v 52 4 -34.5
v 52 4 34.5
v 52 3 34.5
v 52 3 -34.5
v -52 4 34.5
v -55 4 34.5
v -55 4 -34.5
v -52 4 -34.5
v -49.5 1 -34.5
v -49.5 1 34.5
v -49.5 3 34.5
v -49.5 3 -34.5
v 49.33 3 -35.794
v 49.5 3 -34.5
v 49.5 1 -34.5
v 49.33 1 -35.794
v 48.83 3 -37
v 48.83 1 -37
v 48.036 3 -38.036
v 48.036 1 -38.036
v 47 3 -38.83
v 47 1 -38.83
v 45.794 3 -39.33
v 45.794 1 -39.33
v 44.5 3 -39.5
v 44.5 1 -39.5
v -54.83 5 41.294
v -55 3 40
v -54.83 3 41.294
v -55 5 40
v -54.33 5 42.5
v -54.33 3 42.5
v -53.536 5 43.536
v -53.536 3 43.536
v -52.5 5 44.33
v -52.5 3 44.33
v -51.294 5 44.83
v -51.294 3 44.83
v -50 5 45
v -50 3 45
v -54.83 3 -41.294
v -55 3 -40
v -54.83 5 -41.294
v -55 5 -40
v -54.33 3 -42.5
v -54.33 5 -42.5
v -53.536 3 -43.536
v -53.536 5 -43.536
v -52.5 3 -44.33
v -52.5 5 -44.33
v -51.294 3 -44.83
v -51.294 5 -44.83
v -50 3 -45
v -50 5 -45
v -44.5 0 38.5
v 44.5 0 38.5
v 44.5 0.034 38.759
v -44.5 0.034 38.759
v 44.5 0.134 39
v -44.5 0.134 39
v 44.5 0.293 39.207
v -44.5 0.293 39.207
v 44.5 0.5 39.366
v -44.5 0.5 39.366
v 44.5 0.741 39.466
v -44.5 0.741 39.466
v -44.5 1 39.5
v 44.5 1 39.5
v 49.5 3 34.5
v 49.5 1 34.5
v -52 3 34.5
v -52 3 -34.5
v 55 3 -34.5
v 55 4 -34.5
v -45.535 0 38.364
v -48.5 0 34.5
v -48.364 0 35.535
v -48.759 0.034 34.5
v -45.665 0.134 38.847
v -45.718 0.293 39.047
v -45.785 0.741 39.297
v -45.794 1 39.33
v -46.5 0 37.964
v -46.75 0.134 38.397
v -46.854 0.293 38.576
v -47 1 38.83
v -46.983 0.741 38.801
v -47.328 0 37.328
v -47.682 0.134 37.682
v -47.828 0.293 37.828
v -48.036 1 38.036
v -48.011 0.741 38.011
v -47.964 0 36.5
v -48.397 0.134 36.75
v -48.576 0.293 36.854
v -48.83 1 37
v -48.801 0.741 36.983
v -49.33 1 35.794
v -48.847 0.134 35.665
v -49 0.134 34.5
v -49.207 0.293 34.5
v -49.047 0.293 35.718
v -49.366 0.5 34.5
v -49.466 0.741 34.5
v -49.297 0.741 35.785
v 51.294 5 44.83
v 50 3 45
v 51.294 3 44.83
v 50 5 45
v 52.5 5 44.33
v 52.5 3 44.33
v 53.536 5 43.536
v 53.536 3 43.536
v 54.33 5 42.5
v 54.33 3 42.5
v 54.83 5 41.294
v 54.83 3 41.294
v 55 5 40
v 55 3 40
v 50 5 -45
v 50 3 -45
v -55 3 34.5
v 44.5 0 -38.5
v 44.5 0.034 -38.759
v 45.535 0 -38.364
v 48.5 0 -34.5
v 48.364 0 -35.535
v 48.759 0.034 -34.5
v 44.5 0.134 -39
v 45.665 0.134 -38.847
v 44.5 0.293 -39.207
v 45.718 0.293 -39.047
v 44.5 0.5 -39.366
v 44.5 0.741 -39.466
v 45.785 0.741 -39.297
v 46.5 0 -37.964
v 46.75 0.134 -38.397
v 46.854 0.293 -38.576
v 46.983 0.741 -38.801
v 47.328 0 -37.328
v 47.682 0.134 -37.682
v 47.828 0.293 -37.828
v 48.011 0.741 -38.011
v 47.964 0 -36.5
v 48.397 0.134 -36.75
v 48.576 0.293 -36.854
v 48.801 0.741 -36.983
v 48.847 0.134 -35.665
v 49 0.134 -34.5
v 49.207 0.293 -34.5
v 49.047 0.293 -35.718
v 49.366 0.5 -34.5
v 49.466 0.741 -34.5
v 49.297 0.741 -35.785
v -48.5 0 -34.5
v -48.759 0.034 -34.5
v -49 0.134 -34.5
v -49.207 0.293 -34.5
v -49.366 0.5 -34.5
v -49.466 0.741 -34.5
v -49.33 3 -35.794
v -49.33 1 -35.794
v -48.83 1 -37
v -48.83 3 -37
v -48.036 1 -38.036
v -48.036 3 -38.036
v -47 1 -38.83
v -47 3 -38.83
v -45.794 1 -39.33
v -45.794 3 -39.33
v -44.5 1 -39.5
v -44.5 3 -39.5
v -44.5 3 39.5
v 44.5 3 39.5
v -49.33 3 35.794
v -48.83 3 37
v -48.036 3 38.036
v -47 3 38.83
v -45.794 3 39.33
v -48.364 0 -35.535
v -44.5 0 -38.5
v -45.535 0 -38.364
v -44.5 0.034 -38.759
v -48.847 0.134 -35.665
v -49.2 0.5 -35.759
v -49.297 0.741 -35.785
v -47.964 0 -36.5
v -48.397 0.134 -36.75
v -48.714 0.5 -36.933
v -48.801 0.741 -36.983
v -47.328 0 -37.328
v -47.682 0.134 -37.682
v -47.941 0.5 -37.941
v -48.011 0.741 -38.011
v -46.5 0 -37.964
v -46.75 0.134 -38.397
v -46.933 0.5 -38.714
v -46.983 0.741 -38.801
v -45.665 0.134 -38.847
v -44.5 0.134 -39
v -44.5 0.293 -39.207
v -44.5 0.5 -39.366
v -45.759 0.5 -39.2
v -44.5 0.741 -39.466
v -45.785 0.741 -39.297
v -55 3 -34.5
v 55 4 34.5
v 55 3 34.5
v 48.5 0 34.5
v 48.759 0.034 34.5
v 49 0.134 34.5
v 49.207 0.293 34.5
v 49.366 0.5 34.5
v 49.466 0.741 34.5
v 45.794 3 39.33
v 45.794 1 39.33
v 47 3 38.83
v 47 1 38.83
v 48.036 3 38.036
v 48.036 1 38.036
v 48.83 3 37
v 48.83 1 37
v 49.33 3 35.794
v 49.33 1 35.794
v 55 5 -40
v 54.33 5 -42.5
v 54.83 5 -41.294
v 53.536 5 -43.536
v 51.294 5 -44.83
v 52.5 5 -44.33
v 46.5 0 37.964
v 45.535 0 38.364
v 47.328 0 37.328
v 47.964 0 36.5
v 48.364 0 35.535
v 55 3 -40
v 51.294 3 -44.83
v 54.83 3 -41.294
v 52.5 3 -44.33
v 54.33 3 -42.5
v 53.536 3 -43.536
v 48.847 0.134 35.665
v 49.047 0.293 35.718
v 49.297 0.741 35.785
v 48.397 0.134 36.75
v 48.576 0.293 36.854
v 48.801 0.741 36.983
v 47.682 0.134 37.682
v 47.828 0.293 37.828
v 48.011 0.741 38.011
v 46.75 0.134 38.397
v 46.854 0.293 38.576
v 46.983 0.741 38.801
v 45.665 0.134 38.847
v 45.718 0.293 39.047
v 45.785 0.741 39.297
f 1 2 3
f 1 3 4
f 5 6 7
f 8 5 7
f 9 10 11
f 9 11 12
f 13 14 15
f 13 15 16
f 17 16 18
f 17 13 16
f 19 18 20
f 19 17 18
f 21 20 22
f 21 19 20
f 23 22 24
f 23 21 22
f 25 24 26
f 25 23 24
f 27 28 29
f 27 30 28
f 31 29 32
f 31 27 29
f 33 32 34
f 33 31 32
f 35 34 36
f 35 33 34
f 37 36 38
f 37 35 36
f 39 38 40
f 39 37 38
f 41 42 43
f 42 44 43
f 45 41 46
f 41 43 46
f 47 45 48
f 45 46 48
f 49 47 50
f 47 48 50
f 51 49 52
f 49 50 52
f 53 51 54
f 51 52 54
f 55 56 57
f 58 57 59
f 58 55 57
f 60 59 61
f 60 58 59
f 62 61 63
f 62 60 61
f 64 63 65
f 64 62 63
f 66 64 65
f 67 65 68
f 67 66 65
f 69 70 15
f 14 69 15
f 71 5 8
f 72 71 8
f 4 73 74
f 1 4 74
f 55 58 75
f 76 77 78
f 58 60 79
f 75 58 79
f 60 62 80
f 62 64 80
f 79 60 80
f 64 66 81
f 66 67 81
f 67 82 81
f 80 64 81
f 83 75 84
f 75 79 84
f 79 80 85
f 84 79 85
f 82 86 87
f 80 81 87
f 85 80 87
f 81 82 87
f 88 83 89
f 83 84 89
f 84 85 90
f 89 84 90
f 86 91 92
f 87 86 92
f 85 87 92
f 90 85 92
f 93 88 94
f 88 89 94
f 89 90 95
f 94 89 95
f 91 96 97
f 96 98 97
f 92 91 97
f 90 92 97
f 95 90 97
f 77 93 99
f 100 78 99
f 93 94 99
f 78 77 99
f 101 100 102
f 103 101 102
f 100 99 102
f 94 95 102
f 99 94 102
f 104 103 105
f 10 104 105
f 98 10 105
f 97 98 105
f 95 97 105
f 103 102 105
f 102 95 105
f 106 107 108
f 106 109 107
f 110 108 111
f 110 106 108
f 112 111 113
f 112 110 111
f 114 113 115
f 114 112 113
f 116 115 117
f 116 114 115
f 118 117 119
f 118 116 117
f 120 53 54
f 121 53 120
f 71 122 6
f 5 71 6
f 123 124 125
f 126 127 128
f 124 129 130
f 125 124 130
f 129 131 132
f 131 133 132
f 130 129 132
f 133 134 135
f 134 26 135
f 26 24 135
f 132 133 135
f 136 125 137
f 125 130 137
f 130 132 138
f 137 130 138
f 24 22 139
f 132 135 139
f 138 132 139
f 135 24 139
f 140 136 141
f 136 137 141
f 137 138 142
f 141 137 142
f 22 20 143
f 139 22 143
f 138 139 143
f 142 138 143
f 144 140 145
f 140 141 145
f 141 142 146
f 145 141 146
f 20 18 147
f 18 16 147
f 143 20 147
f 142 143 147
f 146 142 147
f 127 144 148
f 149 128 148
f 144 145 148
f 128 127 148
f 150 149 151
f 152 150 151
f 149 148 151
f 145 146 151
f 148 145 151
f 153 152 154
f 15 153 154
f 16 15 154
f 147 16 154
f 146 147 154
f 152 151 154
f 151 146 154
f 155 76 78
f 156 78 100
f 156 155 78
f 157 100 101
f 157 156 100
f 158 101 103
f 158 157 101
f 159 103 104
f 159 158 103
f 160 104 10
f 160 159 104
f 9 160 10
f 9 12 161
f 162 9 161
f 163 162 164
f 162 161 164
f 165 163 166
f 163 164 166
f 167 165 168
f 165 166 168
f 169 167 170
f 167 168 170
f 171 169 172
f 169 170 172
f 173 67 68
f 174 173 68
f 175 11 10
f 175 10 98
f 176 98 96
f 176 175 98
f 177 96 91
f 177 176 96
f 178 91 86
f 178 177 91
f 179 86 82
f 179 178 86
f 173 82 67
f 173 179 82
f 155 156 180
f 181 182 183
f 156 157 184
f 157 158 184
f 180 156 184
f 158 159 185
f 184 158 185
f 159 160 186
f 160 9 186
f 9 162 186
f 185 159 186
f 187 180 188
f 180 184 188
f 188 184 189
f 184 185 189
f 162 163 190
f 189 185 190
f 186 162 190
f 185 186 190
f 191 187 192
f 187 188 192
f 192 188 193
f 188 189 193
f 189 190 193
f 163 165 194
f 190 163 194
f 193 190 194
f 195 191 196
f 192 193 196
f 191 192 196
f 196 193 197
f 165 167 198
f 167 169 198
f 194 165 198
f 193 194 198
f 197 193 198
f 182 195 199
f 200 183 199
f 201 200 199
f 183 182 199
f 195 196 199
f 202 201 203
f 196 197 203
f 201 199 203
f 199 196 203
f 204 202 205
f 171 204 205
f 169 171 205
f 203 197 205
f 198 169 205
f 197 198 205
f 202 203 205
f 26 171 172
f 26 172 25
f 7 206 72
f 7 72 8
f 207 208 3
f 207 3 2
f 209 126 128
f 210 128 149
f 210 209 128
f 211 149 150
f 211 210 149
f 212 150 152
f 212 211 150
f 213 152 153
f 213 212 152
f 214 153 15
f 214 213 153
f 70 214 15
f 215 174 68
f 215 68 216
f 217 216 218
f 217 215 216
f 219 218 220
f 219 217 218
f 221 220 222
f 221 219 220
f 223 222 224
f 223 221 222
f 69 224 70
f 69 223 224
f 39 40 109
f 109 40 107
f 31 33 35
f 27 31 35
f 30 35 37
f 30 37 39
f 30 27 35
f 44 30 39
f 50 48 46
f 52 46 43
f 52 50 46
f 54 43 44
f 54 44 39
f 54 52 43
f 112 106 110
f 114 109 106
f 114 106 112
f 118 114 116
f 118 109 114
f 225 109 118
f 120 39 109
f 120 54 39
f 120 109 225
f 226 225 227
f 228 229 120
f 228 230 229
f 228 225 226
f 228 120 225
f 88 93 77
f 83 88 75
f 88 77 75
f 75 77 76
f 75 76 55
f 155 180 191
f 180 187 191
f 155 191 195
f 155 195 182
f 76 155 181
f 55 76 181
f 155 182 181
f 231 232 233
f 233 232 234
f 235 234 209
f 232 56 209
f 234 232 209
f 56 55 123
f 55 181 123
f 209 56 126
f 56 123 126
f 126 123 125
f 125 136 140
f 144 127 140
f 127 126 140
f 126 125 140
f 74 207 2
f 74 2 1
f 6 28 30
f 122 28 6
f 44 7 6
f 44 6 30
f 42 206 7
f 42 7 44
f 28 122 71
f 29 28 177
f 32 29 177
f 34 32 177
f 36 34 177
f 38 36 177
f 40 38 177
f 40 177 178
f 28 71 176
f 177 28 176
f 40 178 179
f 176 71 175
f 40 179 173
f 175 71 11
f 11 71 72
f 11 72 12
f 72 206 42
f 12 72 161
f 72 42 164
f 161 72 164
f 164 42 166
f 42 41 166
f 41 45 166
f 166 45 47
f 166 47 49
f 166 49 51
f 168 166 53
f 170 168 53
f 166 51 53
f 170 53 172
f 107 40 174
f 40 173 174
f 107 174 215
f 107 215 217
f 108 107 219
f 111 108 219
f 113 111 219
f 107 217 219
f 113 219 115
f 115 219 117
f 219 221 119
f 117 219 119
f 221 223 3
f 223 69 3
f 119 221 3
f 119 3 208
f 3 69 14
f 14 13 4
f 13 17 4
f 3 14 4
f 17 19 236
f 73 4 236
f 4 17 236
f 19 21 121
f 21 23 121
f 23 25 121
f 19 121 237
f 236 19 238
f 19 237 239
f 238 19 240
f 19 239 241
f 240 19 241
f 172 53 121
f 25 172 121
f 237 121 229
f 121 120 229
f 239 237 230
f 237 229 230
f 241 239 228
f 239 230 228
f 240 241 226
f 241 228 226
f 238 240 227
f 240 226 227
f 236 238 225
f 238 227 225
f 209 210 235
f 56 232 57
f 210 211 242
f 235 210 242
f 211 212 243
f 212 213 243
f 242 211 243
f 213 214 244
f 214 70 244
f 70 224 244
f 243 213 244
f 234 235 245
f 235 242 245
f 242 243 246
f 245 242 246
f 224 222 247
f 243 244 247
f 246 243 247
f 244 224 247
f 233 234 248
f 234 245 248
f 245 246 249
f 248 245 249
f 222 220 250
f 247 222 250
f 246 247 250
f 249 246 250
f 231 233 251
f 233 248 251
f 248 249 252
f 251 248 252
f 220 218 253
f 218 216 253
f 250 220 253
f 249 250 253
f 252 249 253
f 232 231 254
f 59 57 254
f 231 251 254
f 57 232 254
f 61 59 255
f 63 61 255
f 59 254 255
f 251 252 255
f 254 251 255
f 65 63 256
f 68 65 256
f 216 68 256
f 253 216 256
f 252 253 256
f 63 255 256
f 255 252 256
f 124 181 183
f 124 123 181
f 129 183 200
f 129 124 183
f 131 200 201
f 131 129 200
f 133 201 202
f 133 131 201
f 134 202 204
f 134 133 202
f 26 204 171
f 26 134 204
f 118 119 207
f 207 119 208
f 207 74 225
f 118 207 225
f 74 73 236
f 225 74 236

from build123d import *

# Parameters (mm, degrees)
SKETCH1_W           = 99
SKETCH1_H           = 79
BOSS_EXTRUDE1_DEPTH = 3
FILLET1_R           = 5
FILLET2_R           = 1
SKETCH2_W           = 110
SKETCH2_H           = 90
BOSS_EXTRUDE2_DEPTH = 2
FILLET3_R           = 5
SKETCH3_W           = 69
SKETCH3_H           = 1
CUT_EXTRUDE1_DEPTH  = 3


with BuildPart() as part:
    # Sketch1 → Boss-Extrude1 (new body)
    with BuildSketch(Plane(origin=(0, 0, 0), x_dir=(1, 0, 0), z_dir=(0, 1, 0))):
        Rectangle(SKETCH1_W, SKETCH1_H)
    extrude(amount=BOSS_EXTRUDE1_DEPTH)

    # Fillet1
    fillet1_edges = [part.edges().sort_by_distance(p)[0] for p in [
        (49.5, 1.5, 39.5),
        (-49.5, 1.5, 39.5),
        (-49.5, 1.5, -39.5),
        (49.5, 1.5, -39.5),
    ]]
    fillet(fillet1_edges, radius=FILLET1_R)

    # Fillet2
    fillet2_edges = [part.edges().sort_by_distance(p)[0] for p in [
        (0, 0, -39.5),
        (49.5, 0, 0),
        (0, 0, 39.5),
        (-49.5, 0, 0),
        (48.035533906, 0, 38.035533906),
        (-48.035533906, 0, 38.035533906),
        (-48.035533906, 0, -38.035533906),
        (48.035533906, 0, -38.035533906),
    ]]
    fillet(fillet2_edges, radius=FILLET2_R)

    # Sketch2 → Boss-Extrude2 (add)
    with BuildSketch(Plane(origin=(0, 3, 0), x_dir=(1, 0, 0), z_dir=(0, 1, 0))):
        Rectangle(SKETCH2_W, SKETCH2_H)
    extrude(amount=BOSS_EXTRUDE2_DEPTH)

    # Fillet3
    fillet3_edges = [part.edges().sort_by_distance(p)[0] for p in [
        (55, 4, 45),
        (55, 4, -45),
        (-55, 4, -45),
        (-55, 4, 45),
    ]]
    fillet(fillet3_edges, radius=FILLET3_R)

    # Sketch3 → Cut-Extrude1 (cut)
    with BuildSketch(Plane(origin=(55, 0, 0), x_dir=(0, 0, -1), z_dir=(1, 0, 0))):
        with Locations((0, 3.5)):
            Rectangle(SKETCH3_W, SKETCH3_H)
    cut_extrude1 = extrude(amount=-CUT_EXTRUDE1_DEPTH, mode=Mode.SUBTRACT)

    # Mirror1: Cut-Extrude1 across plane
    add(cut_extrude1.mirror(Plane(origin=(0, 0, 0), x_dir=(0, 0, 1), z_dir=(1, 0, 0))), mode=Mode.SUBTRACT)


solid = part.part
